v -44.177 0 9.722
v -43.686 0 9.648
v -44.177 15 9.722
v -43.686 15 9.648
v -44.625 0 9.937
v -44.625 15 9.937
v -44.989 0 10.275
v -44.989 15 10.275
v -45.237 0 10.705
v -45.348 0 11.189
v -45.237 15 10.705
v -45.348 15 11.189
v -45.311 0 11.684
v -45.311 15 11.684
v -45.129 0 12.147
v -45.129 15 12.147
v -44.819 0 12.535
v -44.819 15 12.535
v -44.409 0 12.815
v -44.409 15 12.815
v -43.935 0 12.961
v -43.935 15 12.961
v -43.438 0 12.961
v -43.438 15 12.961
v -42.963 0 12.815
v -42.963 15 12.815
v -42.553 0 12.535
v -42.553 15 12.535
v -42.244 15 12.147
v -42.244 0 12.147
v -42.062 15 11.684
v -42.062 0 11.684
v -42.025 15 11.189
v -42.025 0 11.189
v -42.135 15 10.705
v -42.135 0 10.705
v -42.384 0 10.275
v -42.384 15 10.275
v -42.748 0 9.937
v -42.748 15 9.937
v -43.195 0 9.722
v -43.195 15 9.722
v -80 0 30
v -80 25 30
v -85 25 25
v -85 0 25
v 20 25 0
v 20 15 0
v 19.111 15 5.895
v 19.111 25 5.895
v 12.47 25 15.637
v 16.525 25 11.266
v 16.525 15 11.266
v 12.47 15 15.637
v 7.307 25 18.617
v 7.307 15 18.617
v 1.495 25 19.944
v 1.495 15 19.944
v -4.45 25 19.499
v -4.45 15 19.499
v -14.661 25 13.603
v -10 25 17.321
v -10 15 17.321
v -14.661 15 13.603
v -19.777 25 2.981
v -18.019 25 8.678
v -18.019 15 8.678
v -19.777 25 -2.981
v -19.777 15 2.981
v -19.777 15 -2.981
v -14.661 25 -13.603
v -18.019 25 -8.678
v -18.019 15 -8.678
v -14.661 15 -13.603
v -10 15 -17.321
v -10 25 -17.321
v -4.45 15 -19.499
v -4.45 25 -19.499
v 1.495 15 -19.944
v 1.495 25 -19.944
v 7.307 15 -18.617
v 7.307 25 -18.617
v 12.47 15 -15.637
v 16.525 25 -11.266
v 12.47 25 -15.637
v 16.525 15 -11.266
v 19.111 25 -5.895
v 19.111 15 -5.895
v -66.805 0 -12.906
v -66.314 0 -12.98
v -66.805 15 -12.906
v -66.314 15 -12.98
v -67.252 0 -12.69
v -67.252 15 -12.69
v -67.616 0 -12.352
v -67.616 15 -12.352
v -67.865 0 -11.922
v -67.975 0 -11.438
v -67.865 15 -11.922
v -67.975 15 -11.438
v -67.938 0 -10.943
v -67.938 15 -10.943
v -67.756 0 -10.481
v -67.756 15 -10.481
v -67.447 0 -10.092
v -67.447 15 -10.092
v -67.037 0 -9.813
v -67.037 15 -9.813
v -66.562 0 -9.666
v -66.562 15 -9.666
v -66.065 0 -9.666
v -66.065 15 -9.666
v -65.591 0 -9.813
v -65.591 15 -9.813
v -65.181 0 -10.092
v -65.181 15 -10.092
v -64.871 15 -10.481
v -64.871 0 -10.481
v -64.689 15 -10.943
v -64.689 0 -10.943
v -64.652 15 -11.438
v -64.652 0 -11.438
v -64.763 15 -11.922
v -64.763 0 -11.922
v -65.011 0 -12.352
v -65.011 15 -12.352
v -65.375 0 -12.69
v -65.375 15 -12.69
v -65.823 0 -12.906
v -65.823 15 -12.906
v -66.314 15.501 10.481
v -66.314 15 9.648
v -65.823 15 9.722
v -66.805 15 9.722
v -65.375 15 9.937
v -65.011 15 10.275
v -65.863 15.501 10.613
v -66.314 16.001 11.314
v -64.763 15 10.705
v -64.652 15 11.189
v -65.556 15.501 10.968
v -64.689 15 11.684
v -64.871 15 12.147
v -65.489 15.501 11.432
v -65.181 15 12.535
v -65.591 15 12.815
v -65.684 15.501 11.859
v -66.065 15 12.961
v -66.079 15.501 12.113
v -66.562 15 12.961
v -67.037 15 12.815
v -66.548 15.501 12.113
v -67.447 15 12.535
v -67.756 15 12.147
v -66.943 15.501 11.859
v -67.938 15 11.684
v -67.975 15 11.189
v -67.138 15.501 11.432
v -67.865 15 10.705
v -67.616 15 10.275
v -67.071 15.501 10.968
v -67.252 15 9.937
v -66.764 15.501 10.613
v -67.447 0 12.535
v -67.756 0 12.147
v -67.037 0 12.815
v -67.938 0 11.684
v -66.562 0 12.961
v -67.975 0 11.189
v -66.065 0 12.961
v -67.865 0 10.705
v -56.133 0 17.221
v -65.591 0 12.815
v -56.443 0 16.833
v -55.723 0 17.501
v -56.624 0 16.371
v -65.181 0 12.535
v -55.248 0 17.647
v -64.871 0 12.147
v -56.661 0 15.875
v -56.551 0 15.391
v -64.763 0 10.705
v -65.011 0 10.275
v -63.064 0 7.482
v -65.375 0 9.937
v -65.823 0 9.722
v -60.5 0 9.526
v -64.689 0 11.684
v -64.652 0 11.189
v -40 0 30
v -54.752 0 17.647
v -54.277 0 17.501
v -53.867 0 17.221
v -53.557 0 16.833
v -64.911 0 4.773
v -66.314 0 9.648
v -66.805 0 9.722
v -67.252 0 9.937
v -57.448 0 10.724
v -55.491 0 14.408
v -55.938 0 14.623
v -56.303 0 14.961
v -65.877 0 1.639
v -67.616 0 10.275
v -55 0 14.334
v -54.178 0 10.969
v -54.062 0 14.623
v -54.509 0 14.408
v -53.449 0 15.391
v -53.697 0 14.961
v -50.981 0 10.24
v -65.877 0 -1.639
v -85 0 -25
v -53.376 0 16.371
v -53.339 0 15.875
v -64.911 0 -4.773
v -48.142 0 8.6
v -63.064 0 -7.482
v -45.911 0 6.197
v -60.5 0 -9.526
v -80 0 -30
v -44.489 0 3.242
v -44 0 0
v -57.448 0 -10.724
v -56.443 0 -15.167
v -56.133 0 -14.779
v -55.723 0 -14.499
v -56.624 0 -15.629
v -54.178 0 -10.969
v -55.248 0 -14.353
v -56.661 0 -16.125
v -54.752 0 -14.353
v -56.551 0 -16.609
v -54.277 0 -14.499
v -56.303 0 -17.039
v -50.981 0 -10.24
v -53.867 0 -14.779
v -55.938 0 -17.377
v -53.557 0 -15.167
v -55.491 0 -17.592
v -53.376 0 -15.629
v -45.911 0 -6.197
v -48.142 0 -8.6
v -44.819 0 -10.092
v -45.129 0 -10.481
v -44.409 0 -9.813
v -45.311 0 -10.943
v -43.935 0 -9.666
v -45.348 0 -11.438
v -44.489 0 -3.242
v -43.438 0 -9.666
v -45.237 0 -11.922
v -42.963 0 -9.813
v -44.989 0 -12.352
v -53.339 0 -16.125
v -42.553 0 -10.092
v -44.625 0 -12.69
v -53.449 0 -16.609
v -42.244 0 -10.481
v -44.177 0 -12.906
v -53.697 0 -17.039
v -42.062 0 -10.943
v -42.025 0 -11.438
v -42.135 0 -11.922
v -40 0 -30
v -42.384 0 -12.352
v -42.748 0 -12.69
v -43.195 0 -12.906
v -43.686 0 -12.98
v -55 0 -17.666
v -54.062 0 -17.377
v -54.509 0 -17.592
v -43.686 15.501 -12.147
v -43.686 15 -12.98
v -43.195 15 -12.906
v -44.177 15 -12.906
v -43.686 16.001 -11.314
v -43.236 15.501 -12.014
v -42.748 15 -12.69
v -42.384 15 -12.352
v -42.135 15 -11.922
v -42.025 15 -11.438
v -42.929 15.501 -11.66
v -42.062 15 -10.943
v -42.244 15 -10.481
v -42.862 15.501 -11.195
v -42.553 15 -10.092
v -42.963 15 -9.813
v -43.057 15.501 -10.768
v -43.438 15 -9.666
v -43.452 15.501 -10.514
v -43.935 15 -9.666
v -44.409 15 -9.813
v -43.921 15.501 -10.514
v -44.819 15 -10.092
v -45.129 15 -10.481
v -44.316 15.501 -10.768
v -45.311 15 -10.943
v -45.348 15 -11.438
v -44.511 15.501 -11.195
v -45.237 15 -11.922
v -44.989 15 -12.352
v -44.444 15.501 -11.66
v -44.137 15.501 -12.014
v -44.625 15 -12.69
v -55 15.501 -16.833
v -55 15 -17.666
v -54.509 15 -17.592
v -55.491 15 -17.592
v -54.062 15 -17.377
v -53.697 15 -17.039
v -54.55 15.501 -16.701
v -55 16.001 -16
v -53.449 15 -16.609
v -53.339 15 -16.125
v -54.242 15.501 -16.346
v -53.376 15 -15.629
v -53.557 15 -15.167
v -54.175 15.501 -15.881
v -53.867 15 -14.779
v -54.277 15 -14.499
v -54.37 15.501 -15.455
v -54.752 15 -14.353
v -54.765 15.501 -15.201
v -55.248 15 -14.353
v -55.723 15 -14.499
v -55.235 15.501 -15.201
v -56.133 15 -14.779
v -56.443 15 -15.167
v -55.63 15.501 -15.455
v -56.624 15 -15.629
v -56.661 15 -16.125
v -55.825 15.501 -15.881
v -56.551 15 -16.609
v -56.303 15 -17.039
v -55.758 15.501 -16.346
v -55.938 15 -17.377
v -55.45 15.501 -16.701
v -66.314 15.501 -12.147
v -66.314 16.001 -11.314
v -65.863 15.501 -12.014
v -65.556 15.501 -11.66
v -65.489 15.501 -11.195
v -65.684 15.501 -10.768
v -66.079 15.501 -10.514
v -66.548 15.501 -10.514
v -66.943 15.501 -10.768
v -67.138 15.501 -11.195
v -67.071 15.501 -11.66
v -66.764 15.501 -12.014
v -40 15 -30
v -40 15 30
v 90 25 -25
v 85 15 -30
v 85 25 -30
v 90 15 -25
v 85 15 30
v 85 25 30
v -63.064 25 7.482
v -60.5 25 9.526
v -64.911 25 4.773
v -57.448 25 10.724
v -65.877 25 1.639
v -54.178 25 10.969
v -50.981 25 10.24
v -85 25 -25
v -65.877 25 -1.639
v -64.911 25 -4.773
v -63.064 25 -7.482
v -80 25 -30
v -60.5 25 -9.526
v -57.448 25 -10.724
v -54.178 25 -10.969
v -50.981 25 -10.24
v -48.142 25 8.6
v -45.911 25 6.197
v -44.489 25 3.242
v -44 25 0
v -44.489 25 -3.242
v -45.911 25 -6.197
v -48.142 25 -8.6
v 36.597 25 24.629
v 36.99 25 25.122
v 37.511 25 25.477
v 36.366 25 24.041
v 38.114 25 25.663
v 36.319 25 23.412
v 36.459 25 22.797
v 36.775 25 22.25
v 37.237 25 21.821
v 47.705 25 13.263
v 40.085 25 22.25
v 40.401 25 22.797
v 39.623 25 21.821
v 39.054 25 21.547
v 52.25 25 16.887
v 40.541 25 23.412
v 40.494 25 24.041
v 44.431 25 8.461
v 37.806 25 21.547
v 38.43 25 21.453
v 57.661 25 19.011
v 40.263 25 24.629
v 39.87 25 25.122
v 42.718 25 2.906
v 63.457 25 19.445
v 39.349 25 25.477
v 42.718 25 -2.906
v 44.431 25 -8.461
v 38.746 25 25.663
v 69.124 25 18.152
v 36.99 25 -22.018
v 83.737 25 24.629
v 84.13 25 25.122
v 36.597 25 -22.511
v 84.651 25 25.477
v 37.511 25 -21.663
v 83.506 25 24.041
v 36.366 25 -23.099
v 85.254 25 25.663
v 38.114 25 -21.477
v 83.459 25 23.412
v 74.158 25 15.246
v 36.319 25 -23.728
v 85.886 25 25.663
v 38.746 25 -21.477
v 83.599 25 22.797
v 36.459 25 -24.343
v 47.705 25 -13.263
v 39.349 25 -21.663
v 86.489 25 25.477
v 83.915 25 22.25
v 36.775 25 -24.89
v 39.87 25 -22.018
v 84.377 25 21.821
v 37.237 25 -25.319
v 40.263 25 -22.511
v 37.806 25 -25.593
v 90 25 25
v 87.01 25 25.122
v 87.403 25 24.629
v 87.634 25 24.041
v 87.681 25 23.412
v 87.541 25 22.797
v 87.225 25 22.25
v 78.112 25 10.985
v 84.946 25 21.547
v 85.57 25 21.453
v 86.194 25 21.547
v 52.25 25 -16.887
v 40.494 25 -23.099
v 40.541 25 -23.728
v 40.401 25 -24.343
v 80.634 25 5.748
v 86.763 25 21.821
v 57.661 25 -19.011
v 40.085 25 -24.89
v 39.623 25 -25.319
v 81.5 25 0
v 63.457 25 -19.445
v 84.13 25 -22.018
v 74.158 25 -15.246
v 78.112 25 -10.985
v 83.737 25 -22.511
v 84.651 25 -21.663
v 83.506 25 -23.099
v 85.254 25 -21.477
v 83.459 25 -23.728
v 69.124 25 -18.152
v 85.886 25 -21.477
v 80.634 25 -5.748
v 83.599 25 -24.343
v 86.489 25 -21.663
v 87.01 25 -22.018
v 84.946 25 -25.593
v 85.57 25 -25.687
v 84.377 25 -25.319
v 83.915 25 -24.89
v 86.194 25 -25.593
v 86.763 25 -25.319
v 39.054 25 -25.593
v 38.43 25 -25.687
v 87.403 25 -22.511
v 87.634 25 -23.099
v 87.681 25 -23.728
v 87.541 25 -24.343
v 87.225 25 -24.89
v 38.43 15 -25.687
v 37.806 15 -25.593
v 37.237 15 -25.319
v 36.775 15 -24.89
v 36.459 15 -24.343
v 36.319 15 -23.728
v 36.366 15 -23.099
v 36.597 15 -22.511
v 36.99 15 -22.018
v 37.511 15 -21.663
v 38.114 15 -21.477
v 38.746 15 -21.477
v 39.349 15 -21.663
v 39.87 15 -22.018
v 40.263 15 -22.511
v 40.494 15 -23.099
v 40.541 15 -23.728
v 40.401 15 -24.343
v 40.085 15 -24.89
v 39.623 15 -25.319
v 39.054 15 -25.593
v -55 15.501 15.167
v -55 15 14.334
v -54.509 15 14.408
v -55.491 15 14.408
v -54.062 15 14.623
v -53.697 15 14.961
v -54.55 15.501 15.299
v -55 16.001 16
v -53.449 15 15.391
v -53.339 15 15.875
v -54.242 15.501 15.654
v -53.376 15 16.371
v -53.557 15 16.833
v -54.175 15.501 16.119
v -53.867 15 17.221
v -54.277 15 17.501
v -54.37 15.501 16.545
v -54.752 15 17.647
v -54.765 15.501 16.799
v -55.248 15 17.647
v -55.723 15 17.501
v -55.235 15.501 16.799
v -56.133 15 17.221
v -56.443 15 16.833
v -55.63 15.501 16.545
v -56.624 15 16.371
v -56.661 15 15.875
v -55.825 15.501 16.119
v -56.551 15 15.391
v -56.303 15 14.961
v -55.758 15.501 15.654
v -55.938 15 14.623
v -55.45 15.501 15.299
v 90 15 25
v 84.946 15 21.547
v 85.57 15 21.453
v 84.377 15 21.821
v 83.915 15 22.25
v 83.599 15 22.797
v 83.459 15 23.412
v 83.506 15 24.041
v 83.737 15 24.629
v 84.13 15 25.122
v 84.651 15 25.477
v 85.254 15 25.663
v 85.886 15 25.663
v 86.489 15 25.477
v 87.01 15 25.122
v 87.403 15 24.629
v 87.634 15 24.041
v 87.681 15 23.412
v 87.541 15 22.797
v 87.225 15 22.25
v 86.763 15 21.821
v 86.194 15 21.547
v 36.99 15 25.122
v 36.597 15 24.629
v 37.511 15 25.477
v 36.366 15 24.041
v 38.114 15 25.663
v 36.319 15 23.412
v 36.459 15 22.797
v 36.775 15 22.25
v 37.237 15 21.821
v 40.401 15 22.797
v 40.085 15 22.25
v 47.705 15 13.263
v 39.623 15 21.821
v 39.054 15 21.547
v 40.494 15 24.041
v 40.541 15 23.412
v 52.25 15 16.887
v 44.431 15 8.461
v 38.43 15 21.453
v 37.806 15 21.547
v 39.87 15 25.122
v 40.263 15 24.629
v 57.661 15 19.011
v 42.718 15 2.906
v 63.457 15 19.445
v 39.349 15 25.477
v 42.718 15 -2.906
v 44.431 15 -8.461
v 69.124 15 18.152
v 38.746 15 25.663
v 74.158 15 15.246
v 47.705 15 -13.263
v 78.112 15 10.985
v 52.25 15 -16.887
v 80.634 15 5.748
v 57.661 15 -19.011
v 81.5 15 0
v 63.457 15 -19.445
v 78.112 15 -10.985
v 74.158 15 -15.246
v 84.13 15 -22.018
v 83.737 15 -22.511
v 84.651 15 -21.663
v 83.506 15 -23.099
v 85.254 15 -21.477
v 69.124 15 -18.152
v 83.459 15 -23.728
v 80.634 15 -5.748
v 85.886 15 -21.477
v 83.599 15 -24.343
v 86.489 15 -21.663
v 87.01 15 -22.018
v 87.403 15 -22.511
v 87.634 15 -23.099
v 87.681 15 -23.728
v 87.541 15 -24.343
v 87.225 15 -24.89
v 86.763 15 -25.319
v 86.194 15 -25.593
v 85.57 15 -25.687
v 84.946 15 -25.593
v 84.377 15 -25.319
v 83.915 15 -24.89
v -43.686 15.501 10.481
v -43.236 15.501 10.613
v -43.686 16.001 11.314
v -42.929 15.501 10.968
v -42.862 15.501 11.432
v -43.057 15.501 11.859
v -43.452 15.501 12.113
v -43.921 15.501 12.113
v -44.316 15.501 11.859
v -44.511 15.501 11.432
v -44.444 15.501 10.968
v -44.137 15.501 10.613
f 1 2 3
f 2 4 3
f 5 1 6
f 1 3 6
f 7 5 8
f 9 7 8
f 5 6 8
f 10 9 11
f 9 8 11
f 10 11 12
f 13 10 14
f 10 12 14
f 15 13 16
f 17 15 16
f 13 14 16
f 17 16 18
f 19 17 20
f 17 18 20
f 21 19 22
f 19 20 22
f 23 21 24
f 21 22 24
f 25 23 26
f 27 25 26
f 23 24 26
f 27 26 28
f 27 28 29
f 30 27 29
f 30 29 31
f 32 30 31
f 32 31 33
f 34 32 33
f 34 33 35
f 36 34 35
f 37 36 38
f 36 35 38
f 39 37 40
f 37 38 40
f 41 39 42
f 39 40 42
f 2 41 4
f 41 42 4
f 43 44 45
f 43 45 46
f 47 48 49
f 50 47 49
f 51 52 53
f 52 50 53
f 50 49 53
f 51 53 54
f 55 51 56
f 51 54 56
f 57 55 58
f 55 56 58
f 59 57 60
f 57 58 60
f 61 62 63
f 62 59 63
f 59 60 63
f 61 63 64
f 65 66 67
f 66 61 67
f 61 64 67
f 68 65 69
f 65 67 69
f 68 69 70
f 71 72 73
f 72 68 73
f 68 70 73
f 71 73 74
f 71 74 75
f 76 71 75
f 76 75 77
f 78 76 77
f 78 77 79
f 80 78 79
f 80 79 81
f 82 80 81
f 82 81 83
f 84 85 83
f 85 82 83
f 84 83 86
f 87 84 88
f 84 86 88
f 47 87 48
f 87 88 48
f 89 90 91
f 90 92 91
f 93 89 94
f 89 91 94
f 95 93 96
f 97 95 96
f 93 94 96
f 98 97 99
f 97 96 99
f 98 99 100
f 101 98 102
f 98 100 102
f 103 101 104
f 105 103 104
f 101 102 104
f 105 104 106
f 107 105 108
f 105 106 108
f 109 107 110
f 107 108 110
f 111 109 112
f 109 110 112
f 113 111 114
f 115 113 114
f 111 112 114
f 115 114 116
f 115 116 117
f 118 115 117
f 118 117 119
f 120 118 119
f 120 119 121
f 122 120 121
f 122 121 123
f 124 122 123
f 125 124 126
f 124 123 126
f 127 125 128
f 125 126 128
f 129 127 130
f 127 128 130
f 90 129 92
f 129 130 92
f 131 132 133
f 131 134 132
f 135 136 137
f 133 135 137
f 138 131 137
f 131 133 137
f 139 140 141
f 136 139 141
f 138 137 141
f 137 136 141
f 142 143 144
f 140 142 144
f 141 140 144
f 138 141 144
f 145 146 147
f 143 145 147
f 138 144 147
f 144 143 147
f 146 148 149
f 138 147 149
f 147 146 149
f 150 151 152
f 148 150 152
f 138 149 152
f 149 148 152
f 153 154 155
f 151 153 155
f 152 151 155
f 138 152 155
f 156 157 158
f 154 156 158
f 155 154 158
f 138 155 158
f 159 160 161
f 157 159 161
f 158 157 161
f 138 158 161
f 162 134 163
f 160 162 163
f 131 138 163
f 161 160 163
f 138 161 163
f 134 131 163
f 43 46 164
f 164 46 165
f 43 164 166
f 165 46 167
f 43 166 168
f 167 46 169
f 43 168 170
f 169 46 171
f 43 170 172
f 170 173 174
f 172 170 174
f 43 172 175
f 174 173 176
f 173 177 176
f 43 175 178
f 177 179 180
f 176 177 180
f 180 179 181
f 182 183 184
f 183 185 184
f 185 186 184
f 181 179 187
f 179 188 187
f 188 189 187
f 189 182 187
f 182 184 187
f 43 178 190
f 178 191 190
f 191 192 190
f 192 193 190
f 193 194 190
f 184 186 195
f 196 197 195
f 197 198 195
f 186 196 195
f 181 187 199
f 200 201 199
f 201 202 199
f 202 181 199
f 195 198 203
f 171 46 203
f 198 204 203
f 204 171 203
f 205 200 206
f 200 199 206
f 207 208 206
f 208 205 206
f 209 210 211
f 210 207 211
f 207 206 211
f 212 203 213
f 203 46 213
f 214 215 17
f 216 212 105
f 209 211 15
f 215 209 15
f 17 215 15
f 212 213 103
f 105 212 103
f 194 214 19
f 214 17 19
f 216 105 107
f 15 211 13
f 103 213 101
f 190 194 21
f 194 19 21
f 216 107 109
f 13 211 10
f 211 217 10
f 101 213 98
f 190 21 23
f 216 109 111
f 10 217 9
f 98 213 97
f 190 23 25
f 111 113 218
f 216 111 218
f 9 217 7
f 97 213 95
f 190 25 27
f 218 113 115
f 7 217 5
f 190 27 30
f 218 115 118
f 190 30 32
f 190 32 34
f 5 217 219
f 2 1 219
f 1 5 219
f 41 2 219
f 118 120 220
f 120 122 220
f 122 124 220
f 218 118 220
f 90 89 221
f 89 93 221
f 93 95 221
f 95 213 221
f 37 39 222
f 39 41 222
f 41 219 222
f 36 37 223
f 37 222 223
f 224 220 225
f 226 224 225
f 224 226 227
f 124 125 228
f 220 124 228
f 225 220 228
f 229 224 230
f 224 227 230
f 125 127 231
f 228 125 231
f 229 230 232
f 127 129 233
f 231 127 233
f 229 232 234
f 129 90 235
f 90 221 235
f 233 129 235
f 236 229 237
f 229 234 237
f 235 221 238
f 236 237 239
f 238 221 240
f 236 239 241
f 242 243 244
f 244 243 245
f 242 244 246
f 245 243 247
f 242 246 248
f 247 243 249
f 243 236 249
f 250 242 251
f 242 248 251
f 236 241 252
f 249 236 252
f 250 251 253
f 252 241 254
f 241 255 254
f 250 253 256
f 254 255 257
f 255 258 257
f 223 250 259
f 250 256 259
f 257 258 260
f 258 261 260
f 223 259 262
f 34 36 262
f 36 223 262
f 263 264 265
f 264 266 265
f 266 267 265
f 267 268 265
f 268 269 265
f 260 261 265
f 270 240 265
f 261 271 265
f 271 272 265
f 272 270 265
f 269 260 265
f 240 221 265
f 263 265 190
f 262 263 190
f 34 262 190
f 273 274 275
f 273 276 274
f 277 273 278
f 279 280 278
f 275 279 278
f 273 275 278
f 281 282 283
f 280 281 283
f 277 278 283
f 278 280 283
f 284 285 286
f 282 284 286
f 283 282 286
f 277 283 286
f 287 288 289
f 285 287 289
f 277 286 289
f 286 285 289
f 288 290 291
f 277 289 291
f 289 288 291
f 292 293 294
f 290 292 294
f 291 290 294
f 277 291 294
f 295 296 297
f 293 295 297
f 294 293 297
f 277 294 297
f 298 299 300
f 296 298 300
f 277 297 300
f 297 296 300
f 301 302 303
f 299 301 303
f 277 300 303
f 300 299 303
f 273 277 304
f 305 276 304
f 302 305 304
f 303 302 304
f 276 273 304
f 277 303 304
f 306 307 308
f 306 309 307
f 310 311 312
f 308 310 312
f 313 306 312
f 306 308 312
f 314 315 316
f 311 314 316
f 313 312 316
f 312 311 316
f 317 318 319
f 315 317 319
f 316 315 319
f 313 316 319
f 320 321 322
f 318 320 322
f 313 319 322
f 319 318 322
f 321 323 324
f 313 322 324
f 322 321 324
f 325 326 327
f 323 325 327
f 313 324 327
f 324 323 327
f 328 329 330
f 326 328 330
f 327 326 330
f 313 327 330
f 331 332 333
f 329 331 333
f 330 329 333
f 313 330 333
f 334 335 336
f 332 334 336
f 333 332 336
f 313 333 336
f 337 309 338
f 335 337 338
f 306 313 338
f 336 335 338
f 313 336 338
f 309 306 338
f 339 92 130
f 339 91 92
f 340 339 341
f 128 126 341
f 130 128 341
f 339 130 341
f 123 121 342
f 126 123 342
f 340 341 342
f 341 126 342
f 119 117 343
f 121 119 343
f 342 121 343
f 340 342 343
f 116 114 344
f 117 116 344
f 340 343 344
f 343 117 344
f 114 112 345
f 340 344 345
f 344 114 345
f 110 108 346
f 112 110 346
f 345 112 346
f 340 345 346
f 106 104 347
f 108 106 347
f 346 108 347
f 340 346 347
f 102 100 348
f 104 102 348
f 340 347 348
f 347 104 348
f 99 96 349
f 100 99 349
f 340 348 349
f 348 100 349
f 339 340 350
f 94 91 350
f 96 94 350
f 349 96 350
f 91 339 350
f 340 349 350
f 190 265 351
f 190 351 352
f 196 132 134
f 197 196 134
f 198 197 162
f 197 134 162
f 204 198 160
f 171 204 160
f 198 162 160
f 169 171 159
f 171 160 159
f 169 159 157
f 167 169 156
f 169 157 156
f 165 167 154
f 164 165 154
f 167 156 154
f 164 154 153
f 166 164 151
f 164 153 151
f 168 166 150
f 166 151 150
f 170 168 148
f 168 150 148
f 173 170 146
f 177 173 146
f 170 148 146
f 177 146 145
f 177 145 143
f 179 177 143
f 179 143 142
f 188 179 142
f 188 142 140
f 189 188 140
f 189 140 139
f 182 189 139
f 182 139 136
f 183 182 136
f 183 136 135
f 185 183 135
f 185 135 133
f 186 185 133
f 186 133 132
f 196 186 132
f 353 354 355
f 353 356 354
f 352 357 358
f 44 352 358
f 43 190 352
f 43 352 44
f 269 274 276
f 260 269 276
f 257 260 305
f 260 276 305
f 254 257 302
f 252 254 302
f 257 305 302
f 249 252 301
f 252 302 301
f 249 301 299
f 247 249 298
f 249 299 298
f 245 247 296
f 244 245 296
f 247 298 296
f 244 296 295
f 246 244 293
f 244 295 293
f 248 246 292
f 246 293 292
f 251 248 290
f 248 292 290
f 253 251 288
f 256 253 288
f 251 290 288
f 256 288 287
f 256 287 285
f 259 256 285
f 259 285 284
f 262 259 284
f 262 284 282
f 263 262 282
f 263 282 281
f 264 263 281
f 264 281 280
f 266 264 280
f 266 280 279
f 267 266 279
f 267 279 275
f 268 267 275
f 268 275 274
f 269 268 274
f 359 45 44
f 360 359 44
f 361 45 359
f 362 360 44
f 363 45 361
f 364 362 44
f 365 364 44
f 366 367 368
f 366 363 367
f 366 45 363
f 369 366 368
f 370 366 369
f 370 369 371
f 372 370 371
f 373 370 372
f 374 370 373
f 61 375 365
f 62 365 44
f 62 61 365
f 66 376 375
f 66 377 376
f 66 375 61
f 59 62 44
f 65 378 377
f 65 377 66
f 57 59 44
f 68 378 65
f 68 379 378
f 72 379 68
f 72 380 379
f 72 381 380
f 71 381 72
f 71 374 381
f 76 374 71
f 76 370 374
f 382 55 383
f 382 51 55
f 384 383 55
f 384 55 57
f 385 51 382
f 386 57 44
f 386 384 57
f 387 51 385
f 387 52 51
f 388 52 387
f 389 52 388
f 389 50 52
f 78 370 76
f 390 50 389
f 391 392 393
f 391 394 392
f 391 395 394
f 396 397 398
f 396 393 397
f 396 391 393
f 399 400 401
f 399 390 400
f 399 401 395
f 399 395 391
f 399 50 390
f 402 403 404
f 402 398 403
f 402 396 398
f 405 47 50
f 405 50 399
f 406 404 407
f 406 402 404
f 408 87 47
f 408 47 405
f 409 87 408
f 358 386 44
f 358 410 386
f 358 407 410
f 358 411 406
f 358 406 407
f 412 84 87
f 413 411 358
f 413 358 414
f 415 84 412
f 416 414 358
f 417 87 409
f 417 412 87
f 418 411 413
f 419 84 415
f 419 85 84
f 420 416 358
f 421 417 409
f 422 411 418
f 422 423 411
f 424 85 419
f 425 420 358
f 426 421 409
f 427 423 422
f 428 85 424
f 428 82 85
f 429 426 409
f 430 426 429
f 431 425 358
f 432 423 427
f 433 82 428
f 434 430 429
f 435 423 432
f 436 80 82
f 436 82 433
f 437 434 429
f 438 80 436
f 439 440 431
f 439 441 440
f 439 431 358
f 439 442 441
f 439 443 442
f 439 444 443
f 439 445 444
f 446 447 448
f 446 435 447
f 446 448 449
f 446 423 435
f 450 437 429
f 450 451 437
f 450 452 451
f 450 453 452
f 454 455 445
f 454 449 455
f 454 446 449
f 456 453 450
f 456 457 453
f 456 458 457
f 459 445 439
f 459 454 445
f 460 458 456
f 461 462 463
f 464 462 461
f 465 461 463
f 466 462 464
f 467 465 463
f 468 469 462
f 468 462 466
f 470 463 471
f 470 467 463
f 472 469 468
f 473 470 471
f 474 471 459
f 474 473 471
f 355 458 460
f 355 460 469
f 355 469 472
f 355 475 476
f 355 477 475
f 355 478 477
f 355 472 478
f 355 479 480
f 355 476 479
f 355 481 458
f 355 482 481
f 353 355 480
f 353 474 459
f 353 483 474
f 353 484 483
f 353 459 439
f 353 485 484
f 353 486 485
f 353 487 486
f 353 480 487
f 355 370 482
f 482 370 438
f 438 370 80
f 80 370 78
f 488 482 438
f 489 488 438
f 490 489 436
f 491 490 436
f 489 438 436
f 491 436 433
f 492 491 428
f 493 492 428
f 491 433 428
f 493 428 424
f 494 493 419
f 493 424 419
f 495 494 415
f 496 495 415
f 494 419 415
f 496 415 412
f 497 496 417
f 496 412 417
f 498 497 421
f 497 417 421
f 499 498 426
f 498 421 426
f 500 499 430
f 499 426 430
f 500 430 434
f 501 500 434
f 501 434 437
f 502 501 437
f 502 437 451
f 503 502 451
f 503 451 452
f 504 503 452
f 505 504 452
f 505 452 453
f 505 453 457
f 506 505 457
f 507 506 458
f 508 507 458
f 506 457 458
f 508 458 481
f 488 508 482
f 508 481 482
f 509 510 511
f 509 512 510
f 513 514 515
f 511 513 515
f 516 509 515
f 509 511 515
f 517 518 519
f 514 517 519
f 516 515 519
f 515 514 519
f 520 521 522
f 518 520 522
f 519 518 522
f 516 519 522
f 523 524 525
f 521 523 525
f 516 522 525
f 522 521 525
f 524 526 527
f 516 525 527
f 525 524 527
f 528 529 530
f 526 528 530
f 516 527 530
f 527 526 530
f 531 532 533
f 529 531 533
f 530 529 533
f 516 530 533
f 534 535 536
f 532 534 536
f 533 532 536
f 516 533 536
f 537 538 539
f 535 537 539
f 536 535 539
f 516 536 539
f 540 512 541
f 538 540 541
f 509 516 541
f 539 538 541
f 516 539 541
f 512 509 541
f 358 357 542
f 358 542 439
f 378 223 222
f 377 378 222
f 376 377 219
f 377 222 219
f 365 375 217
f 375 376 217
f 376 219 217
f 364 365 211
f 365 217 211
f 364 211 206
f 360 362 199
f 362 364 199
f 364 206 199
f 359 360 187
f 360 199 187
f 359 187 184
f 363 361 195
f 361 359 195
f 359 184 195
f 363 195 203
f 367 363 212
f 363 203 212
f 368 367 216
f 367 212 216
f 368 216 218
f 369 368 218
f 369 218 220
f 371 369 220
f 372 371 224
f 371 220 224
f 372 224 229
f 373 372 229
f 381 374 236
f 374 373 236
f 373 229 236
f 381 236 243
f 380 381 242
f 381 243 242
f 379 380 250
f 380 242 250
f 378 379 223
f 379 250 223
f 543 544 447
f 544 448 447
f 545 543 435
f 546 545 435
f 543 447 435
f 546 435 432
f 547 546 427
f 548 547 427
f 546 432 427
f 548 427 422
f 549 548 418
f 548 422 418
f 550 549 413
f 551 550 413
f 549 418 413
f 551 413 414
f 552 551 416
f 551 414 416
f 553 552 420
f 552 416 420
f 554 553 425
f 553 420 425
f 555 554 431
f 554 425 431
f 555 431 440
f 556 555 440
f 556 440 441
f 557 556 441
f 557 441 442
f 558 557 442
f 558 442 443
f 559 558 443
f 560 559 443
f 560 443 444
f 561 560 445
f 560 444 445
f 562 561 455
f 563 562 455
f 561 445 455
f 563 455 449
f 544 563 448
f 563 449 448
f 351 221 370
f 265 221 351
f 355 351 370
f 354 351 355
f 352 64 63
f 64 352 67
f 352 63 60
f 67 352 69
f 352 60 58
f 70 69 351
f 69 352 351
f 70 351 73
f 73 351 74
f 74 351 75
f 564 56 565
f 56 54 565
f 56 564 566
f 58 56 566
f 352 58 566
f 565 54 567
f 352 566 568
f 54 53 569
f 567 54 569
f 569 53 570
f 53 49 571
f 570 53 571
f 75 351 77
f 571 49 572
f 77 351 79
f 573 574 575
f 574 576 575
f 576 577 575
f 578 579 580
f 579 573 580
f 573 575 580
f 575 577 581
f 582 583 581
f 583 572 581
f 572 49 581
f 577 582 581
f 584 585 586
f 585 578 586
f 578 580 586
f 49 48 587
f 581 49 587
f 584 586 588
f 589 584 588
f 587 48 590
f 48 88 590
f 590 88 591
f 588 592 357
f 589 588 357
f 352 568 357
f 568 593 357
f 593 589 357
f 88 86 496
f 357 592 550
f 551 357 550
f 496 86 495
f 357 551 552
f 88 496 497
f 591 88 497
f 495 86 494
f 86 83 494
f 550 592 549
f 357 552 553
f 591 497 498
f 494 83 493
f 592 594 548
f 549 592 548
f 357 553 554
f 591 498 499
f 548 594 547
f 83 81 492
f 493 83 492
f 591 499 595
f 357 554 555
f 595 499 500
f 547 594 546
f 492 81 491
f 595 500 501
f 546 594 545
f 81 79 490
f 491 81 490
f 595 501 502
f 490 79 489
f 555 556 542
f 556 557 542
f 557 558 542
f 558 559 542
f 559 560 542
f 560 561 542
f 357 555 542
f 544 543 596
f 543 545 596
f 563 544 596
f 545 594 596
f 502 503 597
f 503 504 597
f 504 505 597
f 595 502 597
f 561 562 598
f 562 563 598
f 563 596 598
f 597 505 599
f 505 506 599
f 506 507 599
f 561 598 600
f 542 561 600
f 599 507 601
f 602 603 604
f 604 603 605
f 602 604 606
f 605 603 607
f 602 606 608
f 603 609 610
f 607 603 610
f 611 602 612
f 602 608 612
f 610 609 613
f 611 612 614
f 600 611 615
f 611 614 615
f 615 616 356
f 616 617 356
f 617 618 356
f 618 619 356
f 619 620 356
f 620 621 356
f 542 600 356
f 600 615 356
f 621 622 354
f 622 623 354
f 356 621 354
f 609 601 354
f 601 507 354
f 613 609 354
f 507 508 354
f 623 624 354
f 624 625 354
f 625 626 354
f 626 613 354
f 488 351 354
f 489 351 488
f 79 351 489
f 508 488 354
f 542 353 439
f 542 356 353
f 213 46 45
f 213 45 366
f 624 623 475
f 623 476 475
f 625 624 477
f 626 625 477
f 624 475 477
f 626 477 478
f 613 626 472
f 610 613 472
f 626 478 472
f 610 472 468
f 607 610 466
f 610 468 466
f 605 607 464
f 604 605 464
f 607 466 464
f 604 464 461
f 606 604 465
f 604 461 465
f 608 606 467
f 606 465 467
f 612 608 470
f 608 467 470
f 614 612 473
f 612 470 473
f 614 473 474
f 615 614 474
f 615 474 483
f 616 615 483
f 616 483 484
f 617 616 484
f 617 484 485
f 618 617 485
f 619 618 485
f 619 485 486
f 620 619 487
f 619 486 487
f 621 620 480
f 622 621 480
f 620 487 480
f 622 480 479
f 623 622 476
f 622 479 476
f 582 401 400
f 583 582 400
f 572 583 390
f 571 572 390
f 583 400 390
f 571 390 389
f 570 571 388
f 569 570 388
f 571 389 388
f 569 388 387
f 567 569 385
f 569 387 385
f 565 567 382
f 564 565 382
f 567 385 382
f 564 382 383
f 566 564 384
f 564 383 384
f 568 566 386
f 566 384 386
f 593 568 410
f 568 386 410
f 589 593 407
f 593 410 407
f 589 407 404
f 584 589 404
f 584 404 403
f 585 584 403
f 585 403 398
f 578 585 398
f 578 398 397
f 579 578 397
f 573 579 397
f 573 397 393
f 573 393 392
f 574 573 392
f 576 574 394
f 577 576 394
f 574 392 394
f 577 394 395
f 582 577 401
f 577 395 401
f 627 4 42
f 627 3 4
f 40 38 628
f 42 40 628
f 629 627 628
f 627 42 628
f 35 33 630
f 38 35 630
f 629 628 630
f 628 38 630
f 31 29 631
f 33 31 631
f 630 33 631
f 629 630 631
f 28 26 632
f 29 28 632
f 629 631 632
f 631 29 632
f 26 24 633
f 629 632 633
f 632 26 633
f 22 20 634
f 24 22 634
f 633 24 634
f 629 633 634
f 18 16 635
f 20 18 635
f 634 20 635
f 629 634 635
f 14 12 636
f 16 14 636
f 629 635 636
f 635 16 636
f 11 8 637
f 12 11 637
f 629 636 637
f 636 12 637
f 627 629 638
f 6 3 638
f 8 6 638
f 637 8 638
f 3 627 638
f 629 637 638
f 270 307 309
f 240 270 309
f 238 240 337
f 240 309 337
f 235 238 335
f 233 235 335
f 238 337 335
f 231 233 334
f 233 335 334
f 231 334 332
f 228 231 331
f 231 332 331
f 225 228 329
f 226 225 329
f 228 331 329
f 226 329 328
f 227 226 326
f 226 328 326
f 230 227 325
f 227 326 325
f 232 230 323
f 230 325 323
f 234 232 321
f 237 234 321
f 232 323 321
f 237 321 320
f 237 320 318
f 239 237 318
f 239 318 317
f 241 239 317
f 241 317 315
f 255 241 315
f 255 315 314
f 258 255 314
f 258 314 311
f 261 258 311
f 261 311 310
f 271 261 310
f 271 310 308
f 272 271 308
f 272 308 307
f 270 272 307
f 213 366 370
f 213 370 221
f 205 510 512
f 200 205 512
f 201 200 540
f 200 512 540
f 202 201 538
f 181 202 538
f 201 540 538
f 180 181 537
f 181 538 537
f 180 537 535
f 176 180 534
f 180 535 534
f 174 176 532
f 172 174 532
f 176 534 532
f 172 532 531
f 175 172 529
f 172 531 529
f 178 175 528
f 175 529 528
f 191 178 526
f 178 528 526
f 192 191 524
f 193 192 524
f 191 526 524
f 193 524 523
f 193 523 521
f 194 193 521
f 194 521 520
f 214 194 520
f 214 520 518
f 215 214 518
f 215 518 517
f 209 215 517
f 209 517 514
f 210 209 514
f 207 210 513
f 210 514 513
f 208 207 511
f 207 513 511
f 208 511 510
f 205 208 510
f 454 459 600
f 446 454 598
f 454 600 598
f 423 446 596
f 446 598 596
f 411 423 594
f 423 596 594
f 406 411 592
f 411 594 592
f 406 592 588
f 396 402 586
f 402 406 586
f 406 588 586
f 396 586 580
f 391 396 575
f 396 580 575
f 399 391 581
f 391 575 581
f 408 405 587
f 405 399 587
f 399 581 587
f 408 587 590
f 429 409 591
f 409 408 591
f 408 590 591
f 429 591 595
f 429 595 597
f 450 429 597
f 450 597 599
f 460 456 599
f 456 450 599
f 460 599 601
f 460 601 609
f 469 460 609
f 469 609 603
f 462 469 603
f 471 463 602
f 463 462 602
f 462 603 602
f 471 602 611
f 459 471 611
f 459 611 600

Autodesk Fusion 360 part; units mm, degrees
sketch "Sketch1" plane through (0, 0, 0) normal (0, 1, 0) x (1, 0, 0)
  circle A0 centre (0, 0) radius 20
  circle A1 centre (-55, 0) radius 16 construction
  circle A2 centre (-55, 0) radius 11
  line L0 (0, 0) -> (-55, 0) construction
  line L1 (-85, 30) -> (90, 30)
  line L2 (90, 30) -> (90, -30)
  line L3 (90, -30) -> (-85, -30)
  line L4 (-85, -30) -> (-85, 30)
  line L5 (-40, 30) -> (-40, -30)
  line L6 (-66.3137, -11.3137) -> (-43.6863, 11.3137) construction
  line L7 (-66.3137, 11.3137) -> (-43.6863, -11.3137) construction
  line L8 (-55, 16) -> (-55, -16) construction
  line L9 (38.43, -23.57) -> (85.57, -23.57) construction
  line L10 (85.57, -23.57) -> (85.57, 23.57) construction
  line L11 (85.57, 23.57) -> (38.43, 23.57) construction
  line L12 (38.43, 23.57) -> (38.43, -23.57) construction
  line L13 (38.43, 23.57) -> (85.57, -23.57) construction
  circle A3 centre (62, 0) radius 19.5
  point P0 (-66.3137, 11.3137)
  point P1 (-55, 16)
  point P2 (-43.6863, 11.3137)
  point P3 (-43.6863, -11.3137)
  point P4 (-55, -16)
  point P5 (-66.3137, -11.3137)
  dimension "d1" = 32
  dimension "d2" = 22
  dimension "d3" = 55
  dimension "d4" = 40
  dimension "d5" = 60
  dimension "d6" = 30
  dimension "d7" = 90
  dimension "d8" = 15
  dimension "d9" = 45
  dimension "d20" = 47.14
  dimension "d22" = 39
  dimension "d27" = 62
extrude "Extrude1" add sketch "Sketch1" along normal blind 25
extrude "Extrude3" cut sketch "Sketch1" along normal blind 15 contours L1 L2 L3 L5 | A3
hole "Hole1" at (-66.3137, 0, 11.3137) at (-55, 0, 16) at (-66.3137, 0, -11.3137) at (-55, 0, -16) at (-43.6863, 0, -11.3137) at (-43.6863, 0, 11.3137) direction (0, 1, 0) diameter 3.332 depth 15 tip angle 118
thread "Thread1" "ISO Metric profile 4.0 M4x0.7 6H" thread offset 0 thread depth 10
hole "Hole2" at (38.43, 0, 23.57) at (38.43, 0, -23.57) at (85.57, 0, 23.57) at (85.57, 0, -23.57) direction (0, 1, 0) diameter 4.234 depth 60 tip angle 118
thread "Thread2" "ISO Metric profile 5.0 M5x0.8 6H" thread offset 0 thread depth 10
chamfer "Chamfer1" distance 5 angle 45 4 edges at (-85, 12.5, -30) (-85, 12.5, 30) (90, 20, -30) (90, 20, 30)
